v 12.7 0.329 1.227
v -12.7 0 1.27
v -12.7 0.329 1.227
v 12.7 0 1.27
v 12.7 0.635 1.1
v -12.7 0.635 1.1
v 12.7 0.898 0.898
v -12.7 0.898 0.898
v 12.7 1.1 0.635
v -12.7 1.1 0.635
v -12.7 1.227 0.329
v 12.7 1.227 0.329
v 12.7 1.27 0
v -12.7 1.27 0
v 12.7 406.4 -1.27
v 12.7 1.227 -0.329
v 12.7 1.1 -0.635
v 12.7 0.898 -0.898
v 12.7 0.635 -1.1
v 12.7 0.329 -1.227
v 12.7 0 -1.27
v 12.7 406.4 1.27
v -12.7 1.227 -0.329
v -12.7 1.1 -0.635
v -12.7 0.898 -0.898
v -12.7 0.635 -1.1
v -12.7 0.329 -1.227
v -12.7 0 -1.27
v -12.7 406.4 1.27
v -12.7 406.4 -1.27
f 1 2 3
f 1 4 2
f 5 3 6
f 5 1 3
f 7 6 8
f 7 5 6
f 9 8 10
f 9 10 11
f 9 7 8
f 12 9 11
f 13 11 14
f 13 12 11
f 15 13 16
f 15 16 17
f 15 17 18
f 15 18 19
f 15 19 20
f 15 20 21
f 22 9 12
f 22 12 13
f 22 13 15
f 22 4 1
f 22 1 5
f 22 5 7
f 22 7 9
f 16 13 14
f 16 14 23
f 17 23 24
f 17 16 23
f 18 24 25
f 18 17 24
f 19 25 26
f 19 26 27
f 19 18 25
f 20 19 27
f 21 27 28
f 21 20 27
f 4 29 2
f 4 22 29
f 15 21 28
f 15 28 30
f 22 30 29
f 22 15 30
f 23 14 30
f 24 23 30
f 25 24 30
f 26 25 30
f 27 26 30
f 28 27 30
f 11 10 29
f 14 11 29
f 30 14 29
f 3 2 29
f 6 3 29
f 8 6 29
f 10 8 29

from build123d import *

# Parameters (mm, degrees)
F1_DEPTH = 12.7


with BuildPart() as f1:
    # F0 (on Right) → F1 (new body, symmetric)
    with BuildSketch(Plane.YZ):
        with BuildLine():
            ThreePointArc((0, 1.27), (0.898026, 0.898026), (1.27, 0))
            ThreePointArc((1.27, 0), (0.898026, -0.898026), (0, -1.27))
            Line((0, -1.27), (406.4, -1.27))
            Line((406.4, -1.27), (406.4, 1.27))
            Line((406.4, 1.27), (0, 1.27))
        make_face()
    extrude(amount=F1_DEPTH, both=True)


solid = f1.part
